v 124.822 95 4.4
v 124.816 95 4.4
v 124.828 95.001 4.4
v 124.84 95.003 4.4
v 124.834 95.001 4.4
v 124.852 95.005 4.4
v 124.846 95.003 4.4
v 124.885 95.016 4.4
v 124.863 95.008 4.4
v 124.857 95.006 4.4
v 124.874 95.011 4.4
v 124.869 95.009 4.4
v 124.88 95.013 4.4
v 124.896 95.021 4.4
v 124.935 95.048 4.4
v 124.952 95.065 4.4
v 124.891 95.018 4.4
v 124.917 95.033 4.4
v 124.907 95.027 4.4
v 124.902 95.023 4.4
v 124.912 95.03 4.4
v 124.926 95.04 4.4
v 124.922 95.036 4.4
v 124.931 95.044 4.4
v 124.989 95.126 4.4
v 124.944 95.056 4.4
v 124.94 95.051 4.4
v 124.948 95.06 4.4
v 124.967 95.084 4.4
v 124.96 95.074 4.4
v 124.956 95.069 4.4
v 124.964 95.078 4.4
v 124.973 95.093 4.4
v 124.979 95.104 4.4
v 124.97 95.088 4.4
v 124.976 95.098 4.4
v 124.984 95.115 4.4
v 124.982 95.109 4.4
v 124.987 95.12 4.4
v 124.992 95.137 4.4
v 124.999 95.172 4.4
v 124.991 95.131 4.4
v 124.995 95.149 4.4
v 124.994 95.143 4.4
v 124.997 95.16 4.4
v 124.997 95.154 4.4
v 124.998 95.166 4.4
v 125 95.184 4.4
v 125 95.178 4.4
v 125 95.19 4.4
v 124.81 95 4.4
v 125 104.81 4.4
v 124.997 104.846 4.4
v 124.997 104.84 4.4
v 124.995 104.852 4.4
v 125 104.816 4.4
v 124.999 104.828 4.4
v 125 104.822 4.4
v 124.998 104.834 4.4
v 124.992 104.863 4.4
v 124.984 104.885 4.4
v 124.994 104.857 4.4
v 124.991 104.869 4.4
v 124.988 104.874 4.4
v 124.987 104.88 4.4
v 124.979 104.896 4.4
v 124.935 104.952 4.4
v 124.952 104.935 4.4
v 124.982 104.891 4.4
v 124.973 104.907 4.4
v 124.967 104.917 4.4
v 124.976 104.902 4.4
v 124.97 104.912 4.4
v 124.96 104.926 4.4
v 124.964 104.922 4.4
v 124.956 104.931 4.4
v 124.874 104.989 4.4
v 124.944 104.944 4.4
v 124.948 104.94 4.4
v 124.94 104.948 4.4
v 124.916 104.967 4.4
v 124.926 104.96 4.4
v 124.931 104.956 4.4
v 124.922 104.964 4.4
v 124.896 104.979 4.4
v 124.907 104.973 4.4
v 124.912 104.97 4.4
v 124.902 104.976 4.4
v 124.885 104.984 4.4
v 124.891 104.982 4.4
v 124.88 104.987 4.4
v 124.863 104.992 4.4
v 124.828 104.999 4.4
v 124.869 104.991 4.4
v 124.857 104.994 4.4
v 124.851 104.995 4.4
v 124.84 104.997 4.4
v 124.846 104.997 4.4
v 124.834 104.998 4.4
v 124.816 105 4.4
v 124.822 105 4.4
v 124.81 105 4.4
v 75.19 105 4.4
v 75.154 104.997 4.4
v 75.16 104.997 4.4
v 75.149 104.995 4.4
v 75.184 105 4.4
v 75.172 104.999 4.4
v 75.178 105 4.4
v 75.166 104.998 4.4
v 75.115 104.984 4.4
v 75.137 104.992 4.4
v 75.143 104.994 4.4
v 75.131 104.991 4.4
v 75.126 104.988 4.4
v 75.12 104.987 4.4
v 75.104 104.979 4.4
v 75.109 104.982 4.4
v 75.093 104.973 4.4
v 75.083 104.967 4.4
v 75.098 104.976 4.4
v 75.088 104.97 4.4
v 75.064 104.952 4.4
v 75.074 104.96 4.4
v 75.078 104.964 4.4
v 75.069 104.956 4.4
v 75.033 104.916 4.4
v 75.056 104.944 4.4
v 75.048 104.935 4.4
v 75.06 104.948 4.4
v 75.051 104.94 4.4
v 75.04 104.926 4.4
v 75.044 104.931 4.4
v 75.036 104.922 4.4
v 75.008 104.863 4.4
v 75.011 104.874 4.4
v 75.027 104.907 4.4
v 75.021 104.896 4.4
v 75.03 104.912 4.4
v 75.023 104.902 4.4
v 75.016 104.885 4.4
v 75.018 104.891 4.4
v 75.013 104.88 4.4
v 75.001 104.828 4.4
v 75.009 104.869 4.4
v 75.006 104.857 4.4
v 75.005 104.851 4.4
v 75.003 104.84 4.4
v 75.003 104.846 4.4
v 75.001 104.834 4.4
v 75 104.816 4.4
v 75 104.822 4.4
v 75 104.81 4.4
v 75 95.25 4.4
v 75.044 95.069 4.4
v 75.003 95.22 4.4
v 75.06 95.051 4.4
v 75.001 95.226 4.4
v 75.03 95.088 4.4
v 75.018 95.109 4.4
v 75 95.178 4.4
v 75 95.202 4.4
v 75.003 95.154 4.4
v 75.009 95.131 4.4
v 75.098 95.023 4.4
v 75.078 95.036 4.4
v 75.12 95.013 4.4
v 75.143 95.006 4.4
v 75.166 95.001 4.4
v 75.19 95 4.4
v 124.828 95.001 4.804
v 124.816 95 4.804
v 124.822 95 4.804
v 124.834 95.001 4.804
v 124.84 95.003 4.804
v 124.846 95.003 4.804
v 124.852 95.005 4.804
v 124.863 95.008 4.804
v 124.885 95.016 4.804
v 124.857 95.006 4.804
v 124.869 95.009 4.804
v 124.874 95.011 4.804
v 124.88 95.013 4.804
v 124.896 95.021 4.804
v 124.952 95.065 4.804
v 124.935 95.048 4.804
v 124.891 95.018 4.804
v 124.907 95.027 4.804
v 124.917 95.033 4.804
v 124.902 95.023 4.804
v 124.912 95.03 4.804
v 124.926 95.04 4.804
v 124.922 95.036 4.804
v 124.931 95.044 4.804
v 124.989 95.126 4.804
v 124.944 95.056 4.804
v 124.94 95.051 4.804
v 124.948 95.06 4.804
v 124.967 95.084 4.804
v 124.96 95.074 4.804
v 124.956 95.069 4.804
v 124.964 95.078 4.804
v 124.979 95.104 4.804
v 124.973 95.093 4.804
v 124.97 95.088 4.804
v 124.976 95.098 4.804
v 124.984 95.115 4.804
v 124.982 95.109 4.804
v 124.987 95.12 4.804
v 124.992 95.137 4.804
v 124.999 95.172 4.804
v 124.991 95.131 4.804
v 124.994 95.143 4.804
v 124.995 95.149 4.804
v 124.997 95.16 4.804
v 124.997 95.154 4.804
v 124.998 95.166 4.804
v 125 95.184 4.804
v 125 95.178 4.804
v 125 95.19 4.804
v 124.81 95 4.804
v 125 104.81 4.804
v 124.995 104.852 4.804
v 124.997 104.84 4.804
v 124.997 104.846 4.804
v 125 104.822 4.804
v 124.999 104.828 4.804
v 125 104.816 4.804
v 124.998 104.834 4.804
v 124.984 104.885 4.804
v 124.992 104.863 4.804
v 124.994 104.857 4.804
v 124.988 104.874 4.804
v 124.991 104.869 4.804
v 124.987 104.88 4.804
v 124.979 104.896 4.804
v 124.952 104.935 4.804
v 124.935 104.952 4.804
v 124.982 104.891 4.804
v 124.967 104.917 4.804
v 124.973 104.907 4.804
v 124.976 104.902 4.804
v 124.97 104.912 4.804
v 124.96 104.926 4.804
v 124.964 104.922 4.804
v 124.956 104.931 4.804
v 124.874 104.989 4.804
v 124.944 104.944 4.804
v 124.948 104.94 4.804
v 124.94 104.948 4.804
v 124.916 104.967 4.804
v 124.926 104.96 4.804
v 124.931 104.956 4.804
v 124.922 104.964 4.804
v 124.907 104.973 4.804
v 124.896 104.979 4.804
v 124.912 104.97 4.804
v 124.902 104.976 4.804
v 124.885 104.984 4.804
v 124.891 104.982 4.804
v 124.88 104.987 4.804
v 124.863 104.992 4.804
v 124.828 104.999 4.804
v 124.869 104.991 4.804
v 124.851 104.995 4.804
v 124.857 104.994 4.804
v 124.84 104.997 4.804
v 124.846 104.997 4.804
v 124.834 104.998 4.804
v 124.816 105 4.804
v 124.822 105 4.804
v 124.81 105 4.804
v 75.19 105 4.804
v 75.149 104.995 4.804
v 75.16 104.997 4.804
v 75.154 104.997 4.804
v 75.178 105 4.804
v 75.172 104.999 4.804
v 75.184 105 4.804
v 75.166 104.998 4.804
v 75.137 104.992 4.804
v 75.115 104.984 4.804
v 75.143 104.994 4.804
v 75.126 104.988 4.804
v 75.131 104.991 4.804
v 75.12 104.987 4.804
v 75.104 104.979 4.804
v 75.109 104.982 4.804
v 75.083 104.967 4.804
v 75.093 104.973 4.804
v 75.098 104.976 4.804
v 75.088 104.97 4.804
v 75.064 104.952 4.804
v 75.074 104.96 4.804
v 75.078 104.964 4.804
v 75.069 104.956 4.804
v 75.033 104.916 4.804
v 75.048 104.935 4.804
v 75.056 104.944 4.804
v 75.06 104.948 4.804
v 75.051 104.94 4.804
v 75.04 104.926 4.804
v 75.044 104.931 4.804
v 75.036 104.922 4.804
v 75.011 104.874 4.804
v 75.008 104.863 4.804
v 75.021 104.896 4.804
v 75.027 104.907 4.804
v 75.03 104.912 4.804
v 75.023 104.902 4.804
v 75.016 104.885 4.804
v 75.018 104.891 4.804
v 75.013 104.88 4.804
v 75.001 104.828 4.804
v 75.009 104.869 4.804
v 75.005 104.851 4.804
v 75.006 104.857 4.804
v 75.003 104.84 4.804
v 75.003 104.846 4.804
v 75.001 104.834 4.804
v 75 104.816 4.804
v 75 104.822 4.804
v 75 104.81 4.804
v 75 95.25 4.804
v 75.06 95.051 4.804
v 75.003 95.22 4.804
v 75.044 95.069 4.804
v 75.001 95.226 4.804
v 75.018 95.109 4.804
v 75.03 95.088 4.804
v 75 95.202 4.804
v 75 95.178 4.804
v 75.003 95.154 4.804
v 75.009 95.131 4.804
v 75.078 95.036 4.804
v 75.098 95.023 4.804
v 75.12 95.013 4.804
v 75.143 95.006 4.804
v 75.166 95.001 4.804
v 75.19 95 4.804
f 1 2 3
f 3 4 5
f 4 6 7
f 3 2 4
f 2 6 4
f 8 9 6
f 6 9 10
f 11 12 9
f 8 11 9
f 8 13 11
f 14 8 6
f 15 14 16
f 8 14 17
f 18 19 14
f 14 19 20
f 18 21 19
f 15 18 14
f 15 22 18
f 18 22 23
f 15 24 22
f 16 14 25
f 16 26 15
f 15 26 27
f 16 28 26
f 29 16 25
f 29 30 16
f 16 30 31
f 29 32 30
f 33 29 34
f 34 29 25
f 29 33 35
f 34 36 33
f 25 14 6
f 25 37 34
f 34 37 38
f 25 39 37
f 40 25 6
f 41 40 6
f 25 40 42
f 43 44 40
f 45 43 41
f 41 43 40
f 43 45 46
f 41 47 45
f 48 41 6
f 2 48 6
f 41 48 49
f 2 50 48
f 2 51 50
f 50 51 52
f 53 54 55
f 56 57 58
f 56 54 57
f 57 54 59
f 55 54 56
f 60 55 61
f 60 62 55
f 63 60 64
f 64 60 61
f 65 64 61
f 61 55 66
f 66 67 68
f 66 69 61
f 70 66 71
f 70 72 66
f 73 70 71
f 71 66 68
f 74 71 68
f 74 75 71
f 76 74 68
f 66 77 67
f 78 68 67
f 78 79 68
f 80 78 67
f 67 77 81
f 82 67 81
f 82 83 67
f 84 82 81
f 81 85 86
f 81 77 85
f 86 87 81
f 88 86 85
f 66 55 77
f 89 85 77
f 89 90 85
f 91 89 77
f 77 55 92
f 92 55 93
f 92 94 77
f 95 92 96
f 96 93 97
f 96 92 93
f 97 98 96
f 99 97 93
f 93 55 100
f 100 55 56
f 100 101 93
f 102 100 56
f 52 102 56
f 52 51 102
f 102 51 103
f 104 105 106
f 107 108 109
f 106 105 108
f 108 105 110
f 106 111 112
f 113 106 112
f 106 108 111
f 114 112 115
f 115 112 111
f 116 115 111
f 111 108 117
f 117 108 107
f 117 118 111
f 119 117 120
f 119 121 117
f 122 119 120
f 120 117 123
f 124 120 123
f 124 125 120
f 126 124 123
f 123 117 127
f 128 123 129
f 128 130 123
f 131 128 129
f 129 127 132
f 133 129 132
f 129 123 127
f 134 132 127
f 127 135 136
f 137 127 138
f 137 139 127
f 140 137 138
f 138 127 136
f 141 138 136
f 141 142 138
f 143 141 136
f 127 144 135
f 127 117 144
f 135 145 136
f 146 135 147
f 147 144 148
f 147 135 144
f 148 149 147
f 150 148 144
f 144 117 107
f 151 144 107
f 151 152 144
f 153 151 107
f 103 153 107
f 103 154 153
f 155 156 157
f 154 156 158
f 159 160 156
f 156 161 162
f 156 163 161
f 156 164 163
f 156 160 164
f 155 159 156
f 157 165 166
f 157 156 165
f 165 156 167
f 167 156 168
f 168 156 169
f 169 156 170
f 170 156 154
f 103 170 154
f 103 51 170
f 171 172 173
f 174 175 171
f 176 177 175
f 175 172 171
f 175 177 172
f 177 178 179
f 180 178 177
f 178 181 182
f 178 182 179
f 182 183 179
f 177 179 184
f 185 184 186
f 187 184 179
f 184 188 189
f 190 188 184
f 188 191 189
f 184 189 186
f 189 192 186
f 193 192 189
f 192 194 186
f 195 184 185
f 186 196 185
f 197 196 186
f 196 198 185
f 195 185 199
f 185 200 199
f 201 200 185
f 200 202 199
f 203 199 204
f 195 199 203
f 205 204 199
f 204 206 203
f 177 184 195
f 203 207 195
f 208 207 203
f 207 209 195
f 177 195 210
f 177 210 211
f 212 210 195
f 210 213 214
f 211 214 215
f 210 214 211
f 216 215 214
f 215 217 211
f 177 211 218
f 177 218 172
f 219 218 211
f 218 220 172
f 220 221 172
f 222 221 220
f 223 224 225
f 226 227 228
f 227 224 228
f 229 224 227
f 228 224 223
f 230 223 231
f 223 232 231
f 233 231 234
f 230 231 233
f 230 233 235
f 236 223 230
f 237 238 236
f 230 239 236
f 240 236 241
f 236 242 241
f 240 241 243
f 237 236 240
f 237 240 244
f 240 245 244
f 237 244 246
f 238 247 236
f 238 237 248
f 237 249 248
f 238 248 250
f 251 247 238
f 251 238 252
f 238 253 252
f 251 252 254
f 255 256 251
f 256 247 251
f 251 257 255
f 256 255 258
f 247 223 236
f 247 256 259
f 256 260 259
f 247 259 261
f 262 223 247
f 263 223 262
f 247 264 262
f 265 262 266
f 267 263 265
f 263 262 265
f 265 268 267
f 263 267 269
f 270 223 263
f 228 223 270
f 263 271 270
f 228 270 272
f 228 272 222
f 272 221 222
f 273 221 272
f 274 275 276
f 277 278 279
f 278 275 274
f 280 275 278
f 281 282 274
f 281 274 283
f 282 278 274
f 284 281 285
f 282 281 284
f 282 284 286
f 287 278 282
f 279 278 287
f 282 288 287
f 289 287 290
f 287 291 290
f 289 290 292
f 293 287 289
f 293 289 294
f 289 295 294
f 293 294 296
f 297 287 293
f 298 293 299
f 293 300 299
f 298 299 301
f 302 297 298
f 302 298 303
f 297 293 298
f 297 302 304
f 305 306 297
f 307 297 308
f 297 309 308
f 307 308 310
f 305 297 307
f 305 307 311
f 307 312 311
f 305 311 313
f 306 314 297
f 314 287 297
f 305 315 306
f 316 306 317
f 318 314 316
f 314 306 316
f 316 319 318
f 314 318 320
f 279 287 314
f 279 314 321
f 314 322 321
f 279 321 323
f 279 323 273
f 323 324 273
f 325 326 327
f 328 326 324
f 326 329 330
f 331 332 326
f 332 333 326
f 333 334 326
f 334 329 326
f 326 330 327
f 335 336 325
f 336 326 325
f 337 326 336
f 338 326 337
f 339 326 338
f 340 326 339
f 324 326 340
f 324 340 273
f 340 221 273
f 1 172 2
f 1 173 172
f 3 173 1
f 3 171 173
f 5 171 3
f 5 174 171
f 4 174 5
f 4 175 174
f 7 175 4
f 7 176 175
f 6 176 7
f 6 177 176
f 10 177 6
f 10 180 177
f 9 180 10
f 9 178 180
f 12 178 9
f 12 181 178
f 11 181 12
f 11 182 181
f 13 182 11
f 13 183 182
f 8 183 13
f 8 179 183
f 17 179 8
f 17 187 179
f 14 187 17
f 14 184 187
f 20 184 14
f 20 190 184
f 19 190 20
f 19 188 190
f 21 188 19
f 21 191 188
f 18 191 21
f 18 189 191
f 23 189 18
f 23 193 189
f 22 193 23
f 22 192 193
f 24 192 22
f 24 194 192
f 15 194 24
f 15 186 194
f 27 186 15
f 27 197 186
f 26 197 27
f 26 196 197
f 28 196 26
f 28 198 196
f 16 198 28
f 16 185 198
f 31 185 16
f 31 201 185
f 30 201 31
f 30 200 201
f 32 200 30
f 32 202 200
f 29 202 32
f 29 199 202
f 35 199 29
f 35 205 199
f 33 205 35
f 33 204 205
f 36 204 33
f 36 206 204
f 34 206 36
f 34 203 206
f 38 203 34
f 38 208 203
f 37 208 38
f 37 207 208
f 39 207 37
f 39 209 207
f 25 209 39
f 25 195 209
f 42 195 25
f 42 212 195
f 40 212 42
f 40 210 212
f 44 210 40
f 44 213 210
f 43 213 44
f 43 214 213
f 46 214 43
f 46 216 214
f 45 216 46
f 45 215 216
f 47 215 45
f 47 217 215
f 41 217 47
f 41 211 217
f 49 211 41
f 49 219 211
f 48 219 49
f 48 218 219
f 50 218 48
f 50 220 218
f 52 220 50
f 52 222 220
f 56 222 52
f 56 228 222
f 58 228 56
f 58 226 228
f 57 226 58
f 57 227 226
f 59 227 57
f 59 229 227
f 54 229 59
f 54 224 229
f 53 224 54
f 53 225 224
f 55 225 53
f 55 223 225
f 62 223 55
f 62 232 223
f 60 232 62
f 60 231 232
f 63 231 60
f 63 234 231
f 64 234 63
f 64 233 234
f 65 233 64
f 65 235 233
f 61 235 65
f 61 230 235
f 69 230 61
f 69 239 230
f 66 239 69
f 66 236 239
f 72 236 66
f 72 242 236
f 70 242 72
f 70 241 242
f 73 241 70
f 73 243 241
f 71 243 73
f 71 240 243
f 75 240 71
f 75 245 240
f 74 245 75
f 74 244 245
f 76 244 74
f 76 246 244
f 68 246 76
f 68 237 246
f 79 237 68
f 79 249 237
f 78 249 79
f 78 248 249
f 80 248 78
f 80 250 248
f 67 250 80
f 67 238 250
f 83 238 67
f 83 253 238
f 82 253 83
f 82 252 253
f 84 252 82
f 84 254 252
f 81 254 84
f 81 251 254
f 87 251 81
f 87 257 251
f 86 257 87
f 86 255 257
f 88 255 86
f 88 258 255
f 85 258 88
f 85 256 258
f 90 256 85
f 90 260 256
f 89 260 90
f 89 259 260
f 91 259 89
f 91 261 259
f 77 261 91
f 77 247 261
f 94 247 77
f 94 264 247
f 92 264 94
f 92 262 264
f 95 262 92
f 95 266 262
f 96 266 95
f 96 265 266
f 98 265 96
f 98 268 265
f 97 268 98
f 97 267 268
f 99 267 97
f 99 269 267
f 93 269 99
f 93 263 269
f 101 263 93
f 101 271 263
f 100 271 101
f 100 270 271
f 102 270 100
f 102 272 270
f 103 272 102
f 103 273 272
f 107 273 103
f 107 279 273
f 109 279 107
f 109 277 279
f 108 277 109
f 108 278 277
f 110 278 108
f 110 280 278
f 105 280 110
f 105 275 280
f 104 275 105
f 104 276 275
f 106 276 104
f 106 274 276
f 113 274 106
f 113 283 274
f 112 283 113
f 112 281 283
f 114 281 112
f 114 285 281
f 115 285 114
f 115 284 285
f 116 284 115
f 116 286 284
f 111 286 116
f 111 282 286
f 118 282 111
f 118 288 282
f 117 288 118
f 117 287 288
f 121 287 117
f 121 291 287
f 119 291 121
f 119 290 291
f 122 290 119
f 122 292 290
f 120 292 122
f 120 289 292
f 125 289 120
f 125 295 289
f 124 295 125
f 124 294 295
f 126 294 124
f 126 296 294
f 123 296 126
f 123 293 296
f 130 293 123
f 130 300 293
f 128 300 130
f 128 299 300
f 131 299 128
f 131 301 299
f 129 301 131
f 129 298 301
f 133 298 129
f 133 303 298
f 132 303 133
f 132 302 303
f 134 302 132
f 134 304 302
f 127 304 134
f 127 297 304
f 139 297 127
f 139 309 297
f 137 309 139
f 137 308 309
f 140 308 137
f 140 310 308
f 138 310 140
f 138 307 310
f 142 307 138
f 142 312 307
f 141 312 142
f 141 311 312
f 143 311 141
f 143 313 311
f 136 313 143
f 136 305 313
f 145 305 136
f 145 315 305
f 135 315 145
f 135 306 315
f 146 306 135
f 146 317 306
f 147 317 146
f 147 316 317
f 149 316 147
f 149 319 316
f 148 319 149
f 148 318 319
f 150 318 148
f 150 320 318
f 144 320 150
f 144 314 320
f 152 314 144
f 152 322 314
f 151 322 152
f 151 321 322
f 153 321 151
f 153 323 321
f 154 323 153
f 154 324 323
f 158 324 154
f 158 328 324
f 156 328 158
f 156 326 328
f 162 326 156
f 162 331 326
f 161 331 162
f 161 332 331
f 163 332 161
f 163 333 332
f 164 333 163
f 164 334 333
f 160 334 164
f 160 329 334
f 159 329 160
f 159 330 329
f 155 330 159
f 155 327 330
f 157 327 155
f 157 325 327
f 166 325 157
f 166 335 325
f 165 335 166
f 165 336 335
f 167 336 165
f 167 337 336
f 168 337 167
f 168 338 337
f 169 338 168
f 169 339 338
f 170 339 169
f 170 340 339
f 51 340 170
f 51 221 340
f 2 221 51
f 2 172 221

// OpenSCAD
module drawBasicShape(x1, y1, x2, y2, width)
{
	length = sqrt((x1-x2)*(x1-x2) + (y1-y2)*(y1-y2));
	if (width!=0.0) {
		square(size = [width, length], center = false);
		translate([width/2.0, 0, 0]) circle(d=width);
		translate([width/2.0, length, 0]) circle(d=width);
	}
}

module translateAndRotate(x1, y1, x2, y2, width)
{
	if (width != 0.0) {
		angle = atan((y2-y1)/(x2-x1)) +270;
		if (x2>=x1) {
			translate([x1, y1, 0.0]) rotate([0.0, 0.0, angle]) translate([-width/2.0, 0.0, 0.0]) scale([1.0, 1.0, 1.0]) drawBasicShape(x1, y1, x2, y2, width);
		}
		else {
			translate([x1, y1, 0.0]) rotate([0.0, 0.0, angle+180]) translate([-width/2.0, 0.0, 0.0]) scale([1.0, 1.0, 1.0]) drawBasicShape(x1, y1, x2, y2, width);		}
	}
}

$fn=50;

points10 = [
[75.77800000, 95.77800000, 0.00000000],
[124.22200000, 95.77800000, 0.37999672],
[124.22200000, 104.22200000, 0.37997788],
[75.77800000, 104.22200000, 0.37999548],
[75.77800000, 95.83800000, 0.37998140],
[75.48400000, 95.48400000, 0.00000000],
[124.51600000, 95.48400000, 0.37999746],
[124.51600000, 104.51600000, 0.37998977],
[75.48400000, 104.51600000, 0.37999868],
[75.48400000, 95.54400000, 0.37998644],
[75.19000000, 95.19000000, 0.00000000],
[124.81000000, 95.19000000, 0.38000060],
[124.81000000, 104.81000000, 0.38000021],
[75.19000000, 104.81000000, 0.37999939],
[75.19000000, 95.25000000, 0.37999715],
[75.53600000, 95.39000000, 0.00000000],
[75.94600000, 103.88900000, 0.00000000],
[76.11100000, 104.05400000, 0.37961375],
[76.52800000, 104.05400000, 0.38001190],
[75.94600000, 103.47200000, 0.37997240],
[75.94600000, 103.05500000, 0.38001190],
[76.94500000, 104.05400000, 0.37994651],
[77.36200000, 104.05400000, 0.38001190],
[75.94600000, 102.63800000, 0.37999592],
[75.94600000, 102.22100000, 0.38001190],
[77.77900000, 104.05400000, 0.38002285],
[78.19600000, 104.05400000, 0.38001190],
[75.94600000, 101.80400000, 0.38000201],
[75.94600000, 101.38700000, 0.38001190],
[78.61300000, 104.05400000, 0.38001957],
[79.03000000, 104.05400000, 0.38001190],
[75.94600000, 100.97000000, 0.38001859],
[75.94600000, 100.55300000, 0.38015610],
[79.44700000, 104.05400000, 0.38001785],
[79.86400000, 104.05400000, 0.38001190],
[75.94600000, 100.13600000, 0.38002811],
[75.94600000, 99.71900000, 0.38001190],
[80.28100000, 104.05400000, 0.38002660],
[80.69800000, 104.05400000, 0.38015610],
[75.94600000, 99.30200000, 0.38002534],
[75.94600000, 98.88500000, 0.38001190],
[81.11500000, 104.05400000, 0.38003252],
[81.53300000, 104.05400000, 0.37930814],
[75.94600000, 98.46700000, 0.37997836],
[75.94600000, 98.05000000, 0.38001190],
[81.95000000, 104.05400000, 0.37998780],
[82.36700000, 104.05400000, 0.38001190],
[75.94600000, 97.63300000, 0.37998939],
[75.94600000, 97.21600000, 0.38001190],
[82.78400000, 104.05400000, 0.37999079],
[83.20100000, 104.05400000, 0.38001190],
[75.94600000, 96.79900000, 0.37999203],
[75.94600000, 96.38200000, 0.38015610],
[83.61800000, 104.05400000, 0.37999314],
[84.03500000, 104.05400000, 0.38015610],
[75.95600000, 95.97600000, 0.37999749],
[76.34400000, 95.94600000, 0.37958004],
[84.45200000, 104.05400000, 0.38000754],
[84.86900000, 104.05400000, 0.38001190],
[76.76100000, 95.94600000, 0.38000229],
[77.17800000, 95.94600000, 0.38015610],
[85.28600000, 104.05400000, 0.38000229],
[85.70300000, 104.05400000, 0.38001190],
[77.59500000, 95.94600000, 0.38000754],
[78.01200000, 95.94600000, 0.38001190],
[86.12000000, 104.05400000, 0.38000229],
[86.53700000, 104.05400000, 0.38001190],
[78.42900000, 95.94600000, 0.38000754],
[78.84600000, 95.94600000, 0.38001190],
[86.95400000, 104.05400000, 0.38000229],
[87.37100000, 104.05400000, 0.38015610],
[79.26300000, 95.94600000, 0.38000229],
[79.68000000, 95.94600000, 0.38001190],
[87.78900000, 104.05400000, 0.37998940],
[88.20600000, 104.05400000, 0.38001190],
[80.09700000, 95.94600000, 0.37998415],
[80.51500000, 95.94600000, 0.37930814],
[88.62300000, 104.05400000, 0.38000754],
[89.04000000, 104.05400000, 0.38001190],
[80.93200000, 95.94600000, 0.38000229],
[81.34900000, 95.94600000, 0.38015610],
[89.45700000, 104.05400000, 0.38000229],
[89.87400000, 104.05400000, 0.38001190],
[81.76600000, 95.94600000, 0.38000754],
[82.18300000, 95.94600000, 0.38001190],
[90.29100000, 104.05400000, 0.38000229],
[90.70800000, 104.05400000, 0.38001190],
[82.60000000, 95.94600000, 0.38000754],
[83.01700000, 95.94600000, 0.38001190],
[91.12500000, 104.05400000, 0.38000229],
[91.54200000, 104.05400000, 0.38015610],
[83.43400000, 95.94600000, 0.38000229],
[83.85100000, 95.94600000, 0.38001190],
[91.95900000, 104.05400000, 0.38000754],
[92.37600000, 104.05400000, 0.38001190],
[84.26800000, 95.94600000, 0.38000229],
[84.68500000, 95.94600000, 0.38001190],
[92.79300000, 104.05400000, 0.38000754],
[93.21000000, 104.05400000, 0.38001190],
[85.10200000, 95.94600000, 0.38000229],
[85.51900000, 95.94600000, 0.38015610],
[93.62700000, 104.05400000, 0.38000229],
[94.04400000, 104.05400000, 0.38001190],
[85.93600000, 95.94600000, 0.38000754],
[86.35300000, 95.94600000, 0.38001190],
[94.46200000, 104.05400000, 0.37998415],
[94.87900000, 104.05400000, 0.38001190],
[86.77000000, 95.94600000, 0.37998940],
[87.18800000, 95.94600000, 0.37930814],
[95.29600000, 104.05400000, 0.38000229],
[95.71300000, 104.05400000, 0.38015610],
[87.60500000, 95.94600000, 0.38000229],
[88.02200000, 95.94600000, 0.38001190],
[96.13000000, 104.05400000, 0.38000754],
[96.54700000, 104.05400000, 0.38001190],
[88.43900000, 95.94600000, 0.38000229],
[88.85600000, 95.94600000, 0.38001190],
[96.96400000, 104.05400000, 0.38000754],
[97.38100000, 104.05400000, 0.38001190],
[89.27300000, 95.94600000, 0.38000229],
[89.69000000, 95.94600000, 0.38015610],
[97.79800000, 104.05400000, 0.38000229],
[98.21500000, 104.05400000, 0.38001190],
[90.10700000, 95.94600000, 0.38000754],
[90.52400000, 95.94600000, 0.38001190],
[98.63200000, 104.05400000, 0.38000229],
[99.04900000, 104.05400000, 0.38001190],
[90.94100000, 95.94600000, 0.38000754],
[91.35800000, 95.94600000, 0.38001190],
[99.46600000, 104.05400000, 0.38000229],
[99.88300000, 104.05400000, 0.38015610],
[91.77500000, 95.94600000, 0.38000229],
[92.19200000, 95.94600000, 0.38001190],
[100.30000000, 104.05400000, 0.38000229],
[100.71800000, 104.05400000, 0.37945200],
[92.60900000, 95.94600000, 0.37998415],
[93.02600000, 95.94600000, 0.38001190],
[101.13500000, 104.05400000, 0.37998940],
[101.55200000, 104.05400000, 0.38001190],
[93.44400000, 95.94600000, 0.38000229],
[93.86100000, 95.94600000, 0.38001190],
[101.96900000, 104.05400000, 0.38000754],
[102.38600000, 104.05400000, 0.38001190],
[94.27800000, 95.94600000, 0.38000229],
[94.69500000, 95.94600000, 0.38015610],
[102.80300000, 104.05400000, 0.38000229],
[103.22000000, 104.05400000, 0.38001190],
[95.11200000, 95.94600000, 0.38000754],
[95.52900000, 95.94600000, 0.38001190],
[103.63700000, 104.05400000, 0.38000229],
[104.05400000, 104.05400000, 0.38001190],
[95.94600000, 95.94600000, 0.38000754],
[96.36300000, 95.94600000, 0.38001190],
[104.47100000, 104.05400000, 0.38000229],
[104.88800000, 104.05400000, 0.38015610],
[96.78000000, 95.94600000, 0.38000229],
[97.19700000, 95.94600000, 0.38001190],
[105.30500000, 104.05400000, 0.38000754],
[105.72200000, 104.05400000, 0.38001190],
[97.61400000, 95.94600000, 0.38000229],
[98.03100000, 95.94600000, 0.38001190],
[106.13900000, 104.05400000, 0.38000754],
[106.55600000, 104.05400000, 0.38001190],
[98.44800000, 95.94600000, 0.38000229],
[98.86500000, 95.94600000, 0.38015610],
[106.97300000, 104.05400000, 0.38000229],
[107.39100000, 104.05400000, 0.37930814],
[99.28200000, 95.94600000, 0.37998940],
[99.69900000, 95.94600000, 0.38001190],
[107.80800000, 104.05400000, 0.37998415],
[108.22500000, 104.05400000, 0.38001190],
[100.11700000, 95.94600000, 0.38000754],
[100.53400000, 95.94600000, 0.38001190],
[108.64200000, 104.05400000, 0.38000229],
[109.05900000, 104.05400000, 0.38015610],
[100.95100000, 95.94600000, 0.38000229],
[101.36800000, 95.94600000, 0.38001190],
[109.47600000, 104.05400000, 0.38000754],
[109.89300000, 104.05400000, 0.38001190],
[101.78500000, 95.94600000, 0.38000229],
[102.20200000, 95.94600000, 0.38001190],
[110.31000000, 104.05400000, 0.38000754],
[110.72700000, 104.05400000, 0.38001190],
[102.61900000, 95.94600000, 0.38000229],
[103.03600000, 95.94600000, 0.38015610],
[111.14400000, 104.05400000, 0.38000229],
[111.56100000, 104.05400000, 0.38001190],
[103.45300000, 95.94600000, 0.38000229],
[103.87000000, 95.94600000, 0.38015610],
[111.97800000, 104.05400000, 0.38000229],
[112.39500000, 104.05400000, 0.38001190],
[104.28700000, 95.94600000, 0.38000754],
[104.70400000, 95.94600000, 0.38001190],
[112.81200000, 104.05400000, 0.38000229],
[113.22900000, 104.05400000, 0.38015610],
[105.12100000, 95.94600000, 0.38000229],
[105.53800000, 95.94600000, 0.38001190],
[113.64700000, 104.05400000, 0.37998415],
[114.06400000, 104.05400000, 0.38015610],
[105.95500000, 95.94600000, 0.37998415],
[106.37300000, 95.94600000, 0.37930814],
[114.48100000, 104.05400000, 0.38000754],
[114.89800000, 104.05400000, 0.38001190],
[106.79000000, 95.94600000, 0.38000229],
[107.20700000, 95.94600000, 0.38001190],
[115.31500000, 104.05400000, 0.38000754],
[115.73200000, 104.05400000, 0.38001190],
[107.62400000, 95.94600000, 0.38000229],
[108.04100000, 95.94600000, 0.38015610],
[116.14900000, 104.05400000, 0.38000229],
[116.56600000, 104.05400000, 0.38001190],
[108.45800000, 95.94600000, 0.38000754],
[108.87500000, 95.94600000, 0.38001190],
[116.98300000, 104.05400000, 0.38000229],
[117.40000000, 104.05400000, 0.38001190],
[109.29200000, 95.94600000, 0.38000754],
[109.70900000, 95.94600000, 0.38001190],
[117.81700000, 104.05400000, 0.38000229],
[118.23400000, 104.05400000, 0.38015610],
[110.12600000, 95.94600000, 0.38000229],
[110.54300000, 95.94600000, 0.38001190],
[118.65100000, 104.05400000, 0.38000754],
[119.06800000, 104.05400000, 0.38001190],
[110.96000000, 95.94600000, 0.38000229],
[111.37700000, 95.94600000, 0.38001190],
[119.48500000, 104.05400000, 0.38000754],
[119.90200000, 104.05400000, 0.38001190],
[111.79400000, 95.94600000, 0.38000229],
[112.21100000, 95.94600000, 0.38015610],
[120.32000000, 104.05400000, 0.37998415],
[120.73700000, 104.05400000, 0.38001190],
[112.62900000, 95.94600000, 0.38000754],
[113.04600000, 95.94600000, 0.38001190],
[121.15400000, 104.05400000, 0.38000229],
[121.57100000, 104.05400000, 0.38001190],
[113.46300000, 95.94600000, 0.38000754],
[113.88000000, 95.94600000, 0.38001190],
[121.98800000, 104.05400000, 0.38000229],
[122.40500000, 104.05400000, 0.38015610],
[114.29700000, 95.94600000, 0.38000229],
[114.71400000, 95.94600000, 0.38001190],
[122.82200000, 104.05400000, 0.38000229],
[123.23900000, 104.05400000, 0.38015610],
[115.13100000, 95.94600000, 0.38000229],
[115.54800000, 95.94600000, 0.38001190],
[123.65600000, 104.05400000, 0.38000754],
[124.04400000, 104.02500000, 0.37963728],
[115.96500000, 95.94600000, 0.37998455],
[116.38200000, 95.94600000, 0.38001190],
[124.05400000, 103.61800000, 0.37999868],
[124.05400000, 103.20100000, 0.38001190],
[116.79900000, 95.94600000, 0.37999789],
[117.21600000, 95.94600000, 0.38001190],
[124.05400000, 102.78400000, 0.37999701],
[124.05400000, 102.36700000, 0.38001190],
[117.63300000, 95.94600000, 0.37998939],
[118.05000000, 95.94600000, 0.38001190],
[124.05400000, 101.95000000, 0.37998780],
[124.05400000, 101.53300000, 0.38001190],
[118.46700000, 95.94600000, 0.37997836],
[118.88400000, 95.94600000, 0.38015610],
[124.05400000, 101.11600000, 0.37997562],
[124.05400000, 100.69800000, 0.37930814],
[119.30200000, 95.94600000, 0.38003429],
[119.71900000, 95.94600000, 0.38001190],
[124.05400000, 100.28100000, 0.38002660],
[124.05400000, 99.86400000, 0.38015610],
[120.13600000, 95.94600000, 0.38002811],
[120.55300000, 95.94600000, 0.38001190],
[124.05400000, 99.44700000, 0.38002999],
[124.05400000, 99.03000000, 0.38001190],
[120.97000000, 95.94600000, 0.38001859],
[121.38700000, 95.94600000, 0.38001190],
[124.05400000, 98.61300000, 0.38003551],
[124.05400000, 98.19600000, 0.38001190],
[121.80400000, 95.94600000, 0.38002091],
[122.22100000, 95.94600000, 0.38001190],
[124.05400000, 97.77900000, 0.37999966],
[124.05400000, 97.36200000, 0.38001190],
[122.63800000, 95.94600000, 0.38002595],
[123.05500000, 95.94600000, 0.38001190],
[124.05400000, 96.94500000, 0.37998907],
[124.05400000, 96.52800000, 0.38001190],
[123.47200000, 95.94600000, 0.37989934],
[123.88900000, 95.94600000, 0.38015610],
[124.05400000, 96.11100000, 0.37961375],
];

translate([0.0, 0.0, 4.40000000]) {
	linear_extrude(height = 0.40400000, center = false, convexity = 10, twist = 0) {
		union() {
			for( i=[0:len(points10)-2] ){ 
				x1 = points10[i][0];
				y1 = points10[i][1];
				x2 = points10[i+1][0];
				y2 = points10[i+1][1];
				width = points10[i+1][2];
				translateAndRotate(x1, y1, x2, y2, width);
			}
		}
	}
}
